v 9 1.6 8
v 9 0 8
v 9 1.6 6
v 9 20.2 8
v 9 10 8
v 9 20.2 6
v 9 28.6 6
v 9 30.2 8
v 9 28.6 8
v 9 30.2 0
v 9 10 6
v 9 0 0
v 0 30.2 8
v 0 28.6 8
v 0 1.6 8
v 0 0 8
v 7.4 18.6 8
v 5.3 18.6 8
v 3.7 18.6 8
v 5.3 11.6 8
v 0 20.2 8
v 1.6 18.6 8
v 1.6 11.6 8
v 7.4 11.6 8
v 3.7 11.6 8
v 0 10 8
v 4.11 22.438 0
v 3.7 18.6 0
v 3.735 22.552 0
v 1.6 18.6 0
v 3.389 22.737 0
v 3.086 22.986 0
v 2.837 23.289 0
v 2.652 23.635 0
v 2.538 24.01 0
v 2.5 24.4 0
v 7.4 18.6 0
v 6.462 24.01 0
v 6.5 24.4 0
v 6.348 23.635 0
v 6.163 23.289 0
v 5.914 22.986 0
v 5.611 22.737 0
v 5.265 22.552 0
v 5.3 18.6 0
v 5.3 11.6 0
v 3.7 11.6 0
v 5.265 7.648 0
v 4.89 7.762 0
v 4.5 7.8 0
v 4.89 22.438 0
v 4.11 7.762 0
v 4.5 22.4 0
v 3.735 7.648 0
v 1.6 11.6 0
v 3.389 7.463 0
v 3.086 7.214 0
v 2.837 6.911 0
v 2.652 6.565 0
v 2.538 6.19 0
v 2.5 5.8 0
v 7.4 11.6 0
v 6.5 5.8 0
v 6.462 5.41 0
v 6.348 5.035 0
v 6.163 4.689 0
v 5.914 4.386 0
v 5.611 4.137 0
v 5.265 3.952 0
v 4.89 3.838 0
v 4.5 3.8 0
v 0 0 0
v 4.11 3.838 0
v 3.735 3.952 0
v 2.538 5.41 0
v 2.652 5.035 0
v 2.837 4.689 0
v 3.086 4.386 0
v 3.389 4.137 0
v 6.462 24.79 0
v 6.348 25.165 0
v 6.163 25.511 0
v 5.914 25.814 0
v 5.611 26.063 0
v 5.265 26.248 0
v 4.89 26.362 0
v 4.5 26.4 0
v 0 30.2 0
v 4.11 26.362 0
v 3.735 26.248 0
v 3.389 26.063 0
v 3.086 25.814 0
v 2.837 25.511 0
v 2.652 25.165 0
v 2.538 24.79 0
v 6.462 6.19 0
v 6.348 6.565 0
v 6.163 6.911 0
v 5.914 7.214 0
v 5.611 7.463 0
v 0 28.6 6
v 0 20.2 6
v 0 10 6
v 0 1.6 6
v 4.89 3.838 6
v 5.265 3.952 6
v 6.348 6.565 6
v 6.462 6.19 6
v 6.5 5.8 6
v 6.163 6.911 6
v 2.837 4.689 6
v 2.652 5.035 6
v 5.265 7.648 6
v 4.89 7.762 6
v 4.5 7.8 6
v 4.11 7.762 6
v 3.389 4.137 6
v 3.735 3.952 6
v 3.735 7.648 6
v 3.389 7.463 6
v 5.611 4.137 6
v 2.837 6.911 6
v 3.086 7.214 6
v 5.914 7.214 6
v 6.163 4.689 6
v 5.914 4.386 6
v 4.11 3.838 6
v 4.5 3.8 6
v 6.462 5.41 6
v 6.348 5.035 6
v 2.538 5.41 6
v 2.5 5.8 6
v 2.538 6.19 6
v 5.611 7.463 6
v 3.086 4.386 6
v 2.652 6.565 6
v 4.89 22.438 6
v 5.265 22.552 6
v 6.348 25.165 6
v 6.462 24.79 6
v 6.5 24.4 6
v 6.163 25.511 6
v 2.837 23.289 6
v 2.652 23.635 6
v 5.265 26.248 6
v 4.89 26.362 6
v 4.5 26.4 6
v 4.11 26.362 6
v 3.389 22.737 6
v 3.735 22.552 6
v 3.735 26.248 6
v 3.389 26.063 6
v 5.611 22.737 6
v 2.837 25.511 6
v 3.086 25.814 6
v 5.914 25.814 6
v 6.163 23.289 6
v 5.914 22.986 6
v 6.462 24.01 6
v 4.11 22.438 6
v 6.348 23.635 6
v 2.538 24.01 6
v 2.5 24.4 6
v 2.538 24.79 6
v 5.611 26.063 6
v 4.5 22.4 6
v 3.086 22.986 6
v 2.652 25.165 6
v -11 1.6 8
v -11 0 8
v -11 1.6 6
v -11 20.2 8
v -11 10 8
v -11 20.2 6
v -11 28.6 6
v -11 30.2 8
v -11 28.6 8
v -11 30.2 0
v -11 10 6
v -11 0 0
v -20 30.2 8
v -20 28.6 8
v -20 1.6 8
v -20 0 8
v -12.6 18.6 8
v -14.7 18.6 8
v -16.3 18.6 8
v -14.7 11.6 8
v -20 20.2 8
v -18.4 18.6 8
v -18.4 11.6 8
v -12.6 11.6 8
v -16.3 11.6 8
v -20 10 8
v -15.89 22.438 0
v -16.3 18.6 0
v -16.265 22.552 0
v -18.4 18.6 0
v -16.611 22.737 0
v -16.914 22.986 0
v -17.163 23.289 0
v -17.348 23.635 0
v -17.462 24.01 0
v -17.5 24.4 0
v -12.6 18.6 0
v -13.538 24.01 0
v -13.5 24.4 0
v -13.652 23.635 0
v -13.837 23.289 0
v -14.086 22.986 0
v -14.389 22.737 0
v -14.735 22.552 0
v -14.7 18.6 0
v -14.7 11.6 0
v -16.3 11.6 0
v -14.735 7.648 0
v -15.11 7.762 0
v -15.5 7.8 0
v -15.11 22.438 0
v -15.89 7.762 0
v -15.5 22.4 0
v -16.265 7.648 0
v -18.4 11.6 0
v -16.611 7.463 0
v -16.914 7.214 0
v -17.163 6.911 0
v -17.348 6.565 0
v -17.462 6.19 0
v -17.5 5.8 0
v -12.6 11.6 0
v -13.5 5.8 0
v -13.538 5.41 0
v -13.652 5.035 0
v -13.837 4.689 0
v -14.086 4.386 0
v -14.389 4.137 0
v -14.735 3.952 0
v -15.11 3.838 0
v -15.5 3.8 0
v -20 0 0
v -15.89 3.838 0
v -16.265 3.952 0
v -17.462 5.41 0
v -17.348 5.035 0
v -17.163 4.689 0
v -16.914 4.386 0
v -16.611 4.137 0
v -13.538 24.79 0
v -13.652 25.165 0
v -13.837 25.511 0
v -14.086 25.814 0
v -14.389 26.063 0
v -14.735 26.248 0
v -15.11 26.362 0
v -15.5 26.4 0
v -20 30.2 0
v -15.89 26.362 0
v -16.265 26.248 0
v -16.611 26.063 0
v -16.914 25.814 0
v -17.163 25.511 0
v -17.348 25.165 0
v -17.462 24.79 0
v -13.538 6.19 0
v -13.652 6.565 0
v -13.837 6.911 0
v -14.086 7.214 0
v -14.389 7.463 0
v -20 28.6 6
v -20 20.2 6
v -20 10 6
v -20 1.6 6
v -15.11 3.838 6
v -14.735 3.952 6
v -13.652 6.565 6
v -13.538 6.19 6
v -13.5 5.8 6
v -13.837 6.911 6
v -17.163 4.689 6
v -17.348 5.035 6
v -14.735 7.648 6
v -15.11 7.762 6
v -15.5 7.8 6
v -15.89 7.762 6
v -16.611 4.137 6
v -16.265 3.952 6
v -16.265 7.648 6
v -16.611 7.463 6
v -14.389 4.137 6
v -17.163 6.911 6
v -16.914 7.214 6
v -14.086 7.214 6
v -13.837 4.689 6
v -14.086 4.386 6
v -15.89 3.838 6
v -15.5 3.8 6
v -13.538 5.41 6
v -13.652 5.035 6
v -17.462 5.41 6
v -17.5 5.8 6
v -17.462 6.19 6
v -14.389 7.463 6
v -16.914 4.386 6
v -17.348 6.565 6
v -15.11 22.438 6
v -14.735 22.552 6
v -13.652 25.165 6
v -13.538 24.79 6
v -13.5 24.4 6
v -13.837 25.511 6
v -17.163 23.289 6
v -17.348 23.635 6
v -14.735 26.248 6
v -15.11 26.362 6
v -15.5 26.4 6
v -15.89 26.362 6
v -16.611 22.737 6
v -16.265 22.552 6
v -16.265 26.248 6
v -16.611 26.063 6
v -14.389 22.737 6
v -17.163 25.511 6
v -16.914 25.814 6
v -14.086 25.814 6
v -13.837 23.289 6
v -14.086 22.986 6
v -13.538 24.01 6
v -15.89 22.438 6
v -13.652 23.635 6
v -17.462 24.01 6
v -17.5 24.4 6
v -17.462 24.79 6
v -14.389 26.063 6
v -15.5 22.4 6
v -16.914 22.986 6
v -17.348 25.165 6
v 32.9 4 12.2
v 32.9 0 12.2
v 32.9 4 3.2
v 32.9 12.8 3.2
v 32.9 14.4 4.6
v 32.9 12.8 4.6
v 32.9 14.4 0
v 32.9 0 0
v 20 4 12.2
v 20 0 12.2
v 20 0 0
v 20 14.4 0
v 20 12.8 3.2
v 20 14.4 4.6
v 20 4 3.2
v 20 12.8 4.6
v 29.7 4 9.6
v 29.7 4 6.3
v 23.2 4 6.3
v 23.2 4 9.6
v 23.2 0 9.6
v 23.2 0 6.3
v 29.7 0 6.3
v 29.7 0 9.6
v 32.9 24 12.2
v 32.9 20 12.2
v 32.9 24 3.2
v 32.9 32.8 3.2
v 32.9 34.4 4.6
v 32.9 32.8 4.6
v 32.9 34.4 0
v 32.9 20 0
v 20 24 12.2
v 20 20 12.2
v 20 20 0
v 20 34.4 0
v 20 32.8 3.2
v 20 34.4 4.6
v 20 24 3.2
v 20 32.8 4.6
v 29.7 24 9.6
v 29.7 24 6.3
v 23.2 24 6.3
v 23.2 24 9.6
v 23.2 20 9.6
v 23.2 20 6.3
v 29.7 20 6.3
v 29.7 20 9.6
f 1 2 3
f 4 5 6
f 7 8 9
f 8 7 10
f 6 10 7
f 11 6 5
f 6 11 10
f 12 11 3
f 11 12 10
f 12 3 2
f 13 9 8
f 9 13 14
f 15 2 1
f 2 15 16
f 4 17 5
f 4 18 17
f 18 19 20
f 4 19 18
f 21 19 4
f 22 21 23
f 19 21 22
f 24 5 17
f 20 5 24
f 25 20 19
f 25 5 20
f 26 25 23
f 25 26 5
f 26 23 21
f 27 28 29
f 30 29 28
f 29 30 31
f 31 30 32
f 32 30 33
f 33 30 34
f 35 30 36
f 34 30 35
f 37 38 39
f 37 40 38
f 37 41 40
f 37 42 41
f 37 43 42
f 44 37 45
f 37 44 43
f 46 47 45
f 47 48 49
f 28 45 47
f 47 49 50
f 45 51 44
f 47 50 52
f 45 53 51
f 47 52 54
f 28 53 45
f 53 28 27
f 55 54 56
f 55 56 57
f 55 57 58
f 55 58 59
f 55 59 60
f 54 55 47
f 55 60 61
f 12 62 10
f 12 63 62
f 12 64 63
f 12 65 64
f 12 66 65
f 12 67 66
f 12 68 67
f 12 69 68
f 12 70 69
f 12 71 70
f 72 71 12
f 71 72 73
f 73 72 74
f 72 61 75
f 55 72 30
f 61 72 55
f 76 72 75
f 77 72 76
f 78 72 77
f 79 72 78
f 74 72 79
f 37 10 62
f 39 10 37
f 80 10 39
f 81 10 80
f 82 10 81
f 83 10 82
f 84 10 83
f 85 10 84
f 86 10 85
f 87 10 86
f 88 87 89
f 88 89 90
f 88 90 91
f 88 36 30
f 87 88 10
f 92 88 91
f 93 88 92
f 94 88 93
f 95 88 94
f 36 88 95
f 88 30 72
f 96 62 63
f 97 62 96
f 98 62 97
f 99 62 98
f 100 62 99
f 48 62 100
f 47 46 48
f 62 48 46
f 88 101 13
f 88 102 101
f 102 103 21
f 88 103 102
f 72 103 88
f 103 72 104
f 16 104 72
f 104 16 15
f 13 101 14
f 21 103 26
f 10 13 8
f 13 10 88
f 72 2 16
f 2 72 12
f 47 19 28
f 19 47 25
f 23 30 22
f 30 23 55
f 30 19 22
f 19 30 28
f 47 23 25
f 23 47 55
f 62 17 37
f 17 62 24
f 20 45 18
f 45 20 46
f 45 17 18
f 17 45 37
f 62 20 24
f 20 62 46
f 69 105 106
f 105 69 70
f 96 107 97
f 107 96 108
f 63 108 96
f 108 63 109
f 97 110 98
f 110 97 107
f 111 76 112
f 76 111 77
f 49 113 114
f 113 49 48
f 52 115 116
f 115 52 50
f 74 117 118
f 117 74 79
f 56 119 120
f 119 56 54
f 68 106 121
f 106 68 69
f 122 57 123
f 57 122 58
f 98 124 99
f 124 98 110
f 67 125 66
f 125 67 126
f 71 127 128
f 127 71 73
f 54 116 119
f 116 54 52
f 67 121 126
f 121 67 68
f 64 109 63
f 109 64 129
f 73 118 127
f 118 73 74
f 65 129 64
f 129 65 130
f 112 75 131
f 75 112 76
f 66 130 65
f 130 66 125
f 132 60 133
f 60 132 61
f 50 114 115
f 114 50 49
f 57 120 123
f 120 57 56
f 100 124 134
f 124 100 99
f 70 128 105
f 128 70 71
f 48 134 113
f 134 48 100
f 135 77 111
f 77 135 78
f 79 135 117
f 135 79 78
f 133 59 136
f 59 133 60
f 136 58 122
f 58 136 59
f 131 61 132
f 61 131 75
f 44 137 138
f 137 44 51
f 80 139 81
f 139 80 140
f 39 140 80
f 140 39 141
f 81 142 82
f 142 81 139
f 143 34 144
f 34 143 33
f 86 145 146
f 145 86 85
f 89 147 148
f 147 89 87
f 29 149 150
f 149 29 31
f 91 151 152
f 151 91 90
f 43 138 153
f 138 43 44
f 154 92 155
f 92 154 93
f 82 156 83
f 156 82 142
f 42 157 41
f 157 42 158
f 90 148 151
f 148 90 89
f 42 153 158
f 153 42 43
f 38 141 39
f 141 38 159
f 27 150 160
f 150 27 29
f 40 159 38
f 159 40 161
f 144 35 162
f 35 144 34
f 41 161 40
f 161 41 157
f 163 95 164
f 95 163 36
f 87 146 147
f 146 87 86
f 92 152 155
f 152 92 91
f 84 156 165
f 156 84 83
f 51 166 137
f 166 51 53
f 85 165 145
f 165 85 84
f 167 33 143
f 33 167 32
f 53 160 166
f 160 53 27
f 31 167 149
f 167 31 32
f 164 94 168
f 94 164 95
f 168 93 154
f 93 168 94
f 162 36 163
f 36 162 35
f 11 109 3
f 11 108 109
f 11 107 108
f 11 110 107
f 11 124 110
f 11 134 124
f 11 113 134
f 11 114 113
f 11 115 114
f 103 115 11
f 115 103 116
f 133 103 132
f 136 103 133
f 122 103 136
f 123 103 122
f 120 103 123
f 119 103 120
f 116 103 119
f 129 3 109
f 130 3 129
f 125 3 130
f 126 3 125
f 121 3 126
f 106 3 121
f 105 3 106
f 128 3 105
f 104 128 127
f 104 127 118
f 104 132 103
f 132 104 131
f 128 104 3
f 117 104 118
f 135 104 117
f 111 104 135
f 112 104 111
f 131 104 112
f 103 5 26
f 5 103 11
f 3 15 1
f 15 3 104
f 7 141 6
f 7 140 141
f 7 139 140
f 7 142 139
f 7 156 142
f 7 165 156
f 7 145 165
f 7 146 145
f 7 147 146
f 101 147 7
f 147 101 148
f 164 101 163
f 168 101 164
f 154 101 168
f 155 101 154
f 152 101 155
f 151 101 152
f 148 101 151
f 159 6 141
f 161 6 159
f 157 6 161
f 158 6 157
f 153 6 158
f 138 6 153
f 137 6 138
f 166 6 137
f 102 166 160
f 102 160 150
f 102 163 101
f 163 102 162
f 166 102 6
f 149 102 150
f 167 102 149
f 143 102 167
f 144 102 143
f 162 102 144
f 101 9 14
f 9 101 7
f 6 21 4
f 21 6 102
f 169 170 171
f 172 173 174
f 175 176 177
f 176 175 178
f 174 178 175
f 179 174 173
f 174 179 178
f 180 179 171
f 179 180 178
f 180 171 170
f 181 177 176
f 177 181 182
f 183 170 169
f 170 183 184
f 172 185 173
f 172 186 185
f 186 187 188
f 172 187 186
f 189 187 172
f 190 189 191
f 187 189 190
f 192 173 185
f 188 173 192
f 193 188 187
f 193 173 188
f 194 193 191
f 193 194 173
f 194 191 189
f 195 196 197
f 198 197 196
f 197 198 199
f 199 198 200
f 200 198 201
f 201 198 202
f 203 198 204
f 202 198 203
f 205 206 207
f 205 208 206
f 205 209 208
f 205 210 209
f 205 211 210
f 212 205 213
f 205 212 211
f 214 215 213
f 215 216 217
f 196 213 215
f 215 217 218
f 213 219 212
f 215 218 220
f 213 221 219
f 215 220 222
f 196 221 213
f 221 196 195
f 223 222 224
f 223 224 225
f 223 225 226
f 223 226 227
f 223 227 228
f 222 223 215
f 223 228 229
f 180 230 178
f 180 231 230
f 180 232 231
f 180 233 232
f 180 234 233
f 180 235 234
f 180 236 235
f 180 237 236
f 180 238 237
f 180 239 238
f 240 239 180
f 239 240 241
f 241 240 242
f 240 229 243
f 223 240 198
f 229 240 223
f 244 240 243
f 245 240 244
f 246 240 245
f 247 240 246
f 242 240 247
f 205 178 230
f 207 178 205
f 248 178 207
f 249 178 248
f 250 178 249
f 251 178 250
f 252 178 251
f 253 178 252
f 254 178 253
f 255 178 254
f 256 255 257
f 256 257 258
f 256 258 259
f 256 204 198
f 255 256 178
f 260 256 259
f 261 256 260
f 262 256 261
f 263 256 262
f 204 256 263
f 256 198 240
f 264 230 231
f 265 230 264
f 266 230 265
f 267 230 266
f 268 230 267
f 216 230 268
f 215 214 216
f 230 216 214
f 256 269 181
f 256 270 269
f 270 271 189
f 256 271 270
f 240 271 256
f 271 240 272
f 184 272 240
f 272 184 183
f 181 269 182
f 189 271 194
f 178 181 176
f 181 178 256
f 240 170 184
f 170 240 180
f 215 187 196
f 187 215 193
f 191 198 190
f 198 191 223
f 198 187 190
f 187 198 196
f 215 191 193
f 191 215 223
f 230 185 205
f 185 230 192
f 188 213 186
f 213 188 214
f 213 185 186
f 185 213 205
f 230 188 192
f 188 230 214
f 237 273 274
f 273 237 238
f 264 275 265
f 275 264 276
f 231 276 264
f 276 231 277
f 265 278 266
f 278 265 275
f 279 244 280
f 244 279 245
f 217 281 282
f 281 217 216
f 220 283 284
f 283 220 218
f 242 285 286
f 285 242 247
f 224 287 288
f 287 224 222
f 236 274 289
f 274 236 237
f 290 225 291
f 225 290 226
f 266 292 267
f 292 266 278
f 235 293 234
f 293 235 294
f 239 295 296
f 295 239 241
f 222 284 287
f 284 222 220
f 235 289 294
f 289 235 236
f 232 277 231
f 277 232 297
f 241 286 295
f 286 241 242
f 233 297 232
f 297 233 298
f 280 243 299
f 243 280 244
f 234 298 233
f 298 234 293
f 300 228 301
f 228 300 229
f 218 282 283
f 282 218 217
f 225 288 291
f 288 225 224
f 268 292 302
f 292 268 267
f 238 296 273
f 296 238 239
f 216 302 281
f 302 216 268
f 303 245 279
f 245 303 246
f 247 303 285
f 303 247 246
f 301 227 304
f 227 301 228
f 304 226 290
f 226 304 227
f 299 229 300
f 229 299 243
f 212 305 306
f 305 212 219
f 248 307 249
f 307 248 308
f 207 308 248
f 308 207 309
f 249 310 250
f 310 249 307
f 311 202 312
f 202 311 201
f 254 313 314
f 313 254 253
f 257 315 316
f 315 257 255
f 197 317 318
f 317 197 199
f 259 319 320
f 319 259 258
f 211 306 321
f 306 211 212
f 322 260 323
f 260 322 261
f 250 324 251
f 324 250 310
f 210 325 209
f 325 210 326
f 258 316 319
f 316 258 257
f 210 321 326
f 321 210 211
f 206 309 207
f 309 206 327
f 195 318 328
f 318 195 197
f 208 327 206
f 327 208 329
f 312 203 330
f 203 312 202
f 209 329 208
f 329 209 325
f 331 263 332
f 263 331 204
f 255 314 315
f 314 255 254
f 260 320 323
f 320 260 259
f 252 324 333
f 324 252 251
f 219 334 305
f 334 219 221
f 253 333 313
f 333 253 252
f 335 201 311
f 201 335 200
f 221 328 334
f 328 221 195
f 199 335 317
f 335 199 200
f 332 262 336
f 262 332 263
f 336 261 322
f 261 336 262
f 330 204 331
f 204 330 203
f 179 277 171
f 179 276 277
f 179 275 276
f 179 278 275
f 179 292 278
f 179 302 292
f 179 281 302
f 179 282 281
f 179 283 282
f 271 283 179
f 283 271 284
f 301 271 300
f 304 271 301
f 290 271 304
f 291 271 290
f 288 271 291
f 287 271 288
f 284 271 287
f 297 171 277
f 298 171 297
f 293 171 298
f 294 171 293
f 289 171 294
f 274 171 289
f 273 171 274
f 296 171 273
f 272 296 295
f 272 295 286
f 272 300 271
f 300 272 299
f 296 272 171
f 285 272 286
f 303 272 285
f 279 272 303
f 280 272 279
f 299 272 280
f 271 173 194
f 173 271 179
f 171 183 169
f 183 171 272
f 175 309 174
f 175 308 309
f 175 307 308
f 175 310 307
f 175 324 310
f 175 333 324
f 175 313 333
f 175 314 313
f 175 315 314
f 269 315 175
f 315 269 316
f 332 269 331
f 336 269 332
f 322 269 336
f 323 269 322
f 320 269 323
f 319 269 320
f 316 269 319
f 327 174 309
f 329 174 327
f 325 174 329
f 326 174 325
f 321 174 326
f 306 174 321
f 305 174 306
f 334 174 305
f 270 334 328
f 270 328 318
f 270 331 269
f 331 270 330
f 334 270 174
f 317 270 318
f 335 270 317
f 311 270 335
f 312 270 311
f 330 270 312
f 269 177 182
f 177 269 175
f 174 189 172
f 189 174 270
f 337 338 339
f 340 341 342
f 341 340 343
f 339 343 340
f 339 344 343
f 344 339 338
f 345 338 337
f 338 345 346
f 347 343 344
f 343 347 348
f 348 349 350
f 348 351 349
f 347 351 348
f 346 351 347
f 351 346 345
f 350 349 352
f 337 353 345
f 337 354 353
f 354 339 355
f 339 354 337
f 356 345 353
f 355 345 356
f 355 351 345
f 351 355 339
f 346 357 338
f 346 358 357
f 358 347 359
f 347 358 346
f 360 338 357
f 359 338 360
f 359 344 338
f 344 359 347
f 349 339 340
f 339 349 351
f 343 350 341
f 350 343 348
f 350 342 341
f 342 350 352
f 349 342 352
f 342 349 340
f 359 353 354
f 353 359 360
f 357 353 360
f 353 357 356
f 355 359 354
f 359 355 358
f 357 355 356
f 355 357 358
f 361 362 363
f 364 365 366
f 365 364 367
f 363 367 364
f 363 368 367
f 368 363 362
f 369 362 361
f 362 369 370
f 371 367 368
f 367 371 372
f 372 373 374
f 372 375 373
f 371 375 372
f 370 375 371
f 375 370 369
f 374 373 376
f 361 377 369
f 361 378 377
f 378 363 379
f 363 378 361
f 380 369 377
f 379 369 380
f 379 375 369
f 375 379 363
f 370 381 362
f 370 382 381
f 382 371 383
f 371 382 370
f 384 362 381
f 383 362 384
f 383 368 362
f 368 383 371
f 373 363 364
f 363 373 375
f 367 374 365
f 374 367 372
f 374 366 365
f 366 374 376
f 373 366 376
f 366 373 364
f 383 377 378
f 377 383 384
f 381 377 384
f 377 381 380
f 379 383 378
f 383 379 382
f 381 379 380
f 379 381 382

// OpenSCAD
// belt tightener
// (c) cahorton, 2013:  CC attribution non-commercial

// Description: adujstable belt tensioner with removable clips
// Ok to change these

// (default is sized for GT2)
belt_width = 6;		

// (default is sized for GT2)
belt_height = 1.6;	

// (height of belt when doubled so teeth interlock)
belt_doubled_height = 2.8;	

// Minimum Wall Width
wall = 1.6; 

// extra space in slits, etc
gap = 1; 

// (default sized for a #6 screw)
screw_radius = 2;	

// (default sized for a #6 nut)
nut_radius = 4.2;  	

// (how deep the block slots are)
box_depth = 8;		

// extra space between clip and block, when snapped together
clip_space = .8; 

// extra clearance for belt in the clip slot
clip_gap = .5;

// NOTE: more variables down in the clamp module

// calculated values, don't change these
swall = nut_radius-screw_radius+wall; // wall between screw and slots

box_x = (belt_height  * 2) + (wall * 3)+gap;
box_y = belt_width + gap +  (4*nut_radius)+4*wall;

slot_y = 2*swall+2*screw_radius;

echo("box_x = ", box_x);
echo("box_y = ", box_y);
echo("box_depth = ", box_depth);

module body(){
	difference(){
		
		// body cube
		cube(size=[box_x, box_y, box_depth]);
	
		// slot 1
		translate([wall,slot_y,-1])
		cube(size=[belt_height+gap/2, belt_width+gap, box_depth+2]);
	
		// slot 2
		translate([wall*2+belt_height+gap/2,slot_y,-1])
		cube(size=[belt_height+gap/2, belt_width+gap, box_depth+2]);
	
	
		// screw hole 1
		translate([box_x/2,swall+screw_radius,-1])
		cylinder(r=screw_radius, h=box_x+2, $fn=32);
	
	
		// screw hole 2
		translate([box_x/2,(box_y-(swall+screw_radius)),-1])
		cylinder(r=screw_radius, h=box_x+2, $fn=32);
	
		// nut hole 1
		translate([-1,wall,box_depth-2])
		cube(size=[box_x+2,nut_radius*2, 3]);
	
		// nut hole 2
		translate([-1,box_y-(wall+nut_radius*2),box_depth-2])
		cube(size=[box_x+2,nut_radius*2, 3]);
	
	}
}

body();

translate([-20,0,0])
body();


translate([20,0,0])
clamp();

translate([20,20,0])
clamp();


module clamp(){

	// OK to change these
	clip_gap = .5;
	width = 4;

	// Calculated values, don't change these
	bw = belt_width;
	bx=bw+clip_gap+4*wall;
	by = width;
	bz= box_x+2*wall;

	difference(){
		union(){
			//clamp body
			cube(size=[bx,by,bz]);

			// hook bridge
			cube(size=[bx,clip_space+box_depth+wall+width, 2*wall]);
			
			// hook
			translate([0,clip_space+box_depth+width,wall])
			cube(size=[bx,wall,3]);

		}
	//hole for belt
	translate([2*wall,-1,box_x/2+2*wall-belt_doubled_height/2])
	cube(size=[bw+clip_gap,width+2,belt_doubled_height+clip_gap]);

	}
}
